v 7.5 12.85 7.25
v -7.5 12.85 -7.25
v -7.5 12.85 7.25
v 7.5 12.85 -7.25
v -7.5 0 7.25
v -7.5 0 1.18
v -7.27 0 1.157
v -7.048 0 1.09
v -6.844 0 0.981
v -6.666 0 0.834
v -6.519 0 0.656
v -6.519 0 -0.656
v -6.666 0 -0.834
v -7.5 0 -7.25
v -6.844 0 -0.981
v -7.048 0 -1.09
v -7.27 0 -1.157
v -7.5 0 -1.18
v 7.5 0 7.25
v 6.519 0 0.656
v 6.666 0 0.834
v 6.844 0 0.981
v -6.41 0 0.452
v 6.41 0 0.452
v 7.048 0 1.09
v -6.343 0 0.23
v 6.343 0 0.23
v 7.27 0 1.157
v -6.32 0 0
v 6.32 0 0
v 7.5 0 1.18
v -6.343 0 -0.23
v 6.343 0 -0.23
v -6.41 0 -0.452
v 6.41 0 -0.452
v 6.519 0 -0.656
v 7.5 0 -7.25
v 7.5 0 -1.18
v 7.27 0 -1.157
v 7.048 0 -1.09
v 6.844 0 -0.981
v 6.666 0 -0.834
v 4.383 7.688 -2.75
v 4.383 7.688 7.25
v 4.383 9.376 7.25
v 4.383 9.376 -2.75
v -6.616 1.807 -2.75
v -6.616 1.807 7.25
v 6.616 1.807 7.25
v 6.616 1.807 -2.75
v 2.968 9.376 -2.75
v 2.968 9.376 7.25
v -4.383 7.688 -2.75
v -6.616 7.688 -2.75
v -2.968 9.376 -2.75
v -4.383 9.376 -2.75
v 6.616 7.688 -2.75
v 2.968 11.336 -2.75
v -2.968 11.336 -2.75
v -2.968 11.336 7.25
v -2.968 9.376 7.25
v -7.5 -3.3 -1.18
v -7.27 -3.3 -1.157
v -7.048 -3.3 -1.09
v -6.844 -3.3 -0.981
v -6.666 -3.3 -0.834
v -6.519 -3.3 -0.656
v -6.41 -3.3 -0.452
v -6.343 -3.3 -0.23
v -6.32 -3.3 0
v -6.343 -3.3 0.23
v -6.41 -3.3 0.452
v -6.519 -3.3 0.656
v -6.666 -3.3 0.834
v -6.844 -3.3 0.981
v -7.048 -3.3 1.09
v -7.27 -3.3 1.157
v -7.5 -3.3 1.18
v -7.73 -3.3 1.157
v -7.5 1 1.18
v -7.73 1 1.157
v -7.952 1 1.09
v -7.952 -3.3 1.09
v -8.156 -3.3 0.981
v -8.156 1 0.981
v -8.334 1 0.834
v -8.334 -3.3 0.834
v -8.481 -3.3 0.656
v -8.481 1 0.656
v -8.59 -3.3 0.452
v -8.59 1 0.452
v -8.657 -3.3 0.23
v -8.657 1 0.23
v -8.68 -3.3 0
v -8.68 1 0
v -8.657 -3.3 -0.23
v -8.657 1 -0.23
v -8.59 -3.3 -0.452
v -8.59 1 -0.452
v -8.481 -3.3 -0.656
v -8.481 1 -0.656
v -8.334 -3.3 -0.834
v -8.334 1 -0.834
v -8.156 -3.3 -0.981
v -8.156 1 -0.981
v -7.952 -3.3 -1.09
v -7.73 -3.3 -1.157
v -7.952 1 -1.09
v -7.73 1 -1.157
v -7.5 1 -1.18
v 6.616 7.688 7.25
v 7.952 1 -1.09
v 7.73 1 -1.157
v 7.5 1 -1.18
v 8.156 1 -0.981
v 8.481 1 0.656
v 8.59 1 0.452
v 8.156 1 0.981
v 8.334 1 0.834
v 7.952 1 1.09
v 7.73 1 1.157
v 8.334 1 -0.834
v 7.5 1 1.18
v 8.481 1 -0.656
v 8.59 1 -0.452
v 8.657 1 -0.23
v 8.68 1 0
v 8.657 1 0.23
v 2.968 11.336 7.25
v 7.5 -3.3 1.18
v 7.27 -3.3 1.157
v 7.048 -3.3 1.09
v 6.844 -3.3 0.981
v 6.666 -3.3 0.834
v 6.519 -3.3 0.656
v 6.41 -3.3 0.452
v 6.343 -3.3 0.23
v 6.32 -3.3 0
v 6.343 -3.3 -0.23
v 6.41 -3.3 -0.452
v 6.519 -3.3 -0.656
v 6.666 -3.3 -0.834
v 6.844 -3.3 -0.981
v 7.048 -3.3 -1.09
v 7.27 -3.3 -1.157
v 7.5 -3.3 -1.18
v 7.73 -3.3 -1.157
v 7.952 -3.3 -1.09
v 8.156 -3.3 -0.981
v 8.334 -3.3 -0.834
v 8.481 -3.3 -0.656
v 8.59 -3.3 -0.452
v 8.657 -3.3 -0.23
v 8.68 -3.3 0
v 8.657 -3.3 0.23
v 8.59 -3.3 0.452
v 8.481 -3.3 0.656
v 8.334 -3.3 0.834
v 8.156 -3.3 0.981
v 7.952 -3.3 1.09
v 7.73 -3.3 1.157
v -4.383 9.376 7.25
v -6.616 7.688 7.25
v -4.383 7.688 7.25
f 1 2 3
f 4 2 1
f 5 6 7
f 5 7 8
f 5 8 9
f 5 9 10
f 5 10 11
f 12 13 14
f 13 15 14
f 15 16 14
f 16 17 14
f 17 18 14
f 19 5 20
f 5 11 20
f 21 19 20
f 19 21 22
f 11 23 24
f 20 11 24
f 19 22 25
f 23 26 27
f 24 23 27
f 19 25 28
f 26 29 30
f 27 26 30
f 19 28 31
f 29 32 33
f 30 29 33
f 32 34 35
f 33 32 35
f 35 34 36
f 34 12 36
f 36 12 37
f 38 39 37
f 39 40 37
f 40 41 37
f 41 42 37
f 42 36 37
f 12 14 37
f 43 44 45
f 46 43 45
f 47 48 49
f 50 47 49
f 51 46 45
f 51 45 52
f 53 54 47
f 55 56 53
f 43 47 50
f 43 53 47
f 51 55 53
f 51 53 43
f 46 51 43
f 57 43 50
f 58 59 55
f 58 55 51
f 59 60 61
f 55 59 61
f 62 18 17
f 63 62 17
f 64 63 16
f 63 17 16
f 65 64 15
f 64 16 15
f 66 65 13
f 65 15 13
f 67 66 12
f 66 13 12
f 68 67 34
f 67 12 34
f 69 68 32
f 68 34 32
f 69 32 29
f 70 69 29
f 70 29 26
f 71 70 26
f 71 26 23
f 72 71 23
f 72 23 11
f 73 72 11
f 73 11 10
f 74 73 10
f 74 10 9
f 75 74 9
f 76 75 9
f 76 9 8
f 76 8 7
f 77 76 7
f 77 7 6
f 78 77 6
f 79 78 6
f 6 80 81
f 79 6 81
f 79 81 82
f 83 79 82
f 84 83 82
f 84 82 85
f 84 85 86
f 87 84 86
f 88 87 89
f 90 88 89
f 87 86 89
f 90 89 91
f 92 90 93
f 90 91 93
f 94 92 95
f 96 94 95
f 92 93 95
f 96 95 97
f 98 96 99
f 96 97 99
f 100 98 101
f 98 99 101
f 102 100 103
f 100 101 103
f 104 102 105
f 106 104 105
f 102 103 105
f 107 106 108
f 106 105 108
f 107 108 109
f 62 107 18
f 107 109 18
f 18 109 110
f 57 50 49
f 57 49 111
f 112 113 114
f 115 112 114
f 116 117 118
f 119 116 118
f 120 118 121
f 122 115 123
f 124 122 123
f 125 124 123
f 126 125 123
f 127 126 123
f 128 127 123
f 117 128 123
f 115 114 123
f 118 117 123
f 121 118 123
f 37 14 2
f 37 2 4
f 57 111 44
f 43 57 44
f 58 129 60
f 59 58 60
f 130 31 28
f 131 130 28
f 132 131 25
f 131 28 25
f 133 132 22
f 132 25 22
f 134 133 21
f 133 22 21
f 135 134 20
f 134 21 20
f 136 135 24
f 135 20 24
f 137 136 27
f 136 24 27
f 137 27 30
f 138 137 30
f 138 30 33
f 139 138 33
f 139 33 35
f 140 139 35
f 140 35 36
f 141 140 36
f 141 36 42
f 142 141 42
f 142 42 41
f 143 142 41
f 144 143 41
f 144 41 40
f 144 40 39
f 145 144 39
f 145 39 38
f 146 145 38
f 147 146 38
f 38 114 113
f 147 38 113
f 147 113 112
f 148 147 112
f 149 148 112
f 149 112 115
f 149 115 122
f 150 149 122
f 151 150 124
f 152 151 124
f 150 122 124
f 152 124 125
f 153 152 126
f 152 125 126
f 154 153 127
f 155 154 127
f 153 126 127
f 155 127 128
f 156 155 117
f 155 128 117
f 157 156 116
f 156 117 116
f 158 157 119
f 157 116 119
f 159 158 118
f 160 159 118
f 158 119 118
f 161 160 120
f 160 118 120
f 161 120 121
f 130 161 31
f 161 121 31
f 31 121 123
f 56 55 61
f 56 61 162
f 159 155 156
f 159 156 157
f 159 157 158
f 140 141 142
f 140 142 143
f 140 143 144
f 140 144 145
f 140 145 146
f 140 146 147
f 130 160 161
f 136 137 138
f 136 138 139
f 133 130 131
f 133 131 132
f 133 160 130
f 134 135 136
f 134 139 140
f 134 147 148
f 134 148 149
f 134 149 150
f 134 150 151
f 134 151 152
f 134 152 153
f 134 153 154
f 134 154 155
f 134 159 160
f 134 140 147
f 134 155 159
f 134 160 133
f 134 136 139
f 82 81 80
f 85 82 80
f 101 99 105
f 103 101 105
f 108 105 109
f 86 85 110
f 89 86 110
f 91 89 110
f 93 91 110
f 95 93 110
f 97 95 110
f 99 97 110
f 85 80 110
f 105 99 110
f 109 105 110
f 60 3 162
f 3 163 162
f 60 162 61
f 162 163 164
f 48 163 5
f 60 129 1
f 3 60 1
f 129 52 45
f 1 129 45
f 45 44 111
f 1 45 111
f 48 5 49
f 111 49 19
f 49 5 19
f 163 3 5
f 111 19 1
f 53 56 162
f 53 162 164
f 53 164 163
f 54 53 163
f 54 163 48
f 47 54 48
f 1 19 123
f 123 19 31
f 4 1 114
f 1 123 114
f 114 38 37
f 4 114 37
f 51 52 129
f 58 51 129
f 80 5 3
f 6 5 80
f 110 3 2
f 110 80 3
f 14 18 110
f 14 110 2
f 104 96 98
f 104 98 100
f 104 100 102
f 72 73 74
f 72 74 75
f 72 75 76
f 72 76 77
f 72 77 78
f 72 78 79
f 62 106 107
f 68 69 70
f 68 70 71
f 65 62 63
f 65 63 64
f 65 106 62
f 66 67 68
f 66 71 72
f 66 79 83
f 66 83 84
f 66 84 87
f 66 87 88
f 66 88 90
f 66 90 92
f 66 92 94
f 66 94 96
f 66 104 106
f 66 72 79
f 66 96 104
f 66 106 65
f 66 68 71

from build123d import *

# Parameters (mm, degrees)
SKETCH_1_W           = 15
SKETCH_1_H           = 14.5
EXTRUDE_1_DEPTH      = 12.85
EXTRUDE_2_DEPTH      = 3.3
EXTRUDE_2_DEPTH_BACK = 1
SKETCH_2_R           = 1.18
CUT_EXTRUDE_1_DEPTH  = 10


with BuildPart() as part:
    # 草图1 → 凸台-拉伸1 (new body)
    with BuildSketch(Plane(origin=(0, 0, 0), x_dir=(1, 0, 0), z_dir=(0, 1, 0))):
        Rectangle(SKETCH_1_W, SKETCH_1_H)
    extrude(amount=EXTRUDE_1_DEPTH)

    # 草图2 → 凸台-拉伸2 (add, two sides: drawn at the far end of the back side and taken through both)
    with BuildSketch(Plane.XZ.offset(-EXTRUDE_2_DEPTH_BACK)):
        with Locations(Location((-7.5, 0, 0), (0, 0, 270))):
            Circle(SKETCH_2_R)
        with Locations(Location((7.5, 0, 0), (0, 0, 90))):
            Circle(SKETCH_2_R)
    extrude(amount=EXTRUDE_2_DEPTH + EXTRUDE_2_DEPTH_BACK)

    # 草图3 → 切除-拉伸1 (cut)
    with BuildSketch(Plane.XY.offset(7.25)):
        Polygon((2.967608293, 11.336409161), (-2.967608293, 11.336409161), (-2.967608293, 9.376154142), (-4.383348029, 9.376154142), (-4.383348029, 7.688156764), (-6.615860689, 7.688156764), (-6.615860689, 1.807391707), (6.615860689, 1.807391707), (6.615860689, 7.688156764), (4.383348029, 7.688156764), (4.383348029, 9.376154142), (2.967608293, 9.376154142), align=None)
    extrude(amount=-CUT_EXTRUDE_1_DEPTH, mode=Mode.SUBTRACT)


solid = part.part
